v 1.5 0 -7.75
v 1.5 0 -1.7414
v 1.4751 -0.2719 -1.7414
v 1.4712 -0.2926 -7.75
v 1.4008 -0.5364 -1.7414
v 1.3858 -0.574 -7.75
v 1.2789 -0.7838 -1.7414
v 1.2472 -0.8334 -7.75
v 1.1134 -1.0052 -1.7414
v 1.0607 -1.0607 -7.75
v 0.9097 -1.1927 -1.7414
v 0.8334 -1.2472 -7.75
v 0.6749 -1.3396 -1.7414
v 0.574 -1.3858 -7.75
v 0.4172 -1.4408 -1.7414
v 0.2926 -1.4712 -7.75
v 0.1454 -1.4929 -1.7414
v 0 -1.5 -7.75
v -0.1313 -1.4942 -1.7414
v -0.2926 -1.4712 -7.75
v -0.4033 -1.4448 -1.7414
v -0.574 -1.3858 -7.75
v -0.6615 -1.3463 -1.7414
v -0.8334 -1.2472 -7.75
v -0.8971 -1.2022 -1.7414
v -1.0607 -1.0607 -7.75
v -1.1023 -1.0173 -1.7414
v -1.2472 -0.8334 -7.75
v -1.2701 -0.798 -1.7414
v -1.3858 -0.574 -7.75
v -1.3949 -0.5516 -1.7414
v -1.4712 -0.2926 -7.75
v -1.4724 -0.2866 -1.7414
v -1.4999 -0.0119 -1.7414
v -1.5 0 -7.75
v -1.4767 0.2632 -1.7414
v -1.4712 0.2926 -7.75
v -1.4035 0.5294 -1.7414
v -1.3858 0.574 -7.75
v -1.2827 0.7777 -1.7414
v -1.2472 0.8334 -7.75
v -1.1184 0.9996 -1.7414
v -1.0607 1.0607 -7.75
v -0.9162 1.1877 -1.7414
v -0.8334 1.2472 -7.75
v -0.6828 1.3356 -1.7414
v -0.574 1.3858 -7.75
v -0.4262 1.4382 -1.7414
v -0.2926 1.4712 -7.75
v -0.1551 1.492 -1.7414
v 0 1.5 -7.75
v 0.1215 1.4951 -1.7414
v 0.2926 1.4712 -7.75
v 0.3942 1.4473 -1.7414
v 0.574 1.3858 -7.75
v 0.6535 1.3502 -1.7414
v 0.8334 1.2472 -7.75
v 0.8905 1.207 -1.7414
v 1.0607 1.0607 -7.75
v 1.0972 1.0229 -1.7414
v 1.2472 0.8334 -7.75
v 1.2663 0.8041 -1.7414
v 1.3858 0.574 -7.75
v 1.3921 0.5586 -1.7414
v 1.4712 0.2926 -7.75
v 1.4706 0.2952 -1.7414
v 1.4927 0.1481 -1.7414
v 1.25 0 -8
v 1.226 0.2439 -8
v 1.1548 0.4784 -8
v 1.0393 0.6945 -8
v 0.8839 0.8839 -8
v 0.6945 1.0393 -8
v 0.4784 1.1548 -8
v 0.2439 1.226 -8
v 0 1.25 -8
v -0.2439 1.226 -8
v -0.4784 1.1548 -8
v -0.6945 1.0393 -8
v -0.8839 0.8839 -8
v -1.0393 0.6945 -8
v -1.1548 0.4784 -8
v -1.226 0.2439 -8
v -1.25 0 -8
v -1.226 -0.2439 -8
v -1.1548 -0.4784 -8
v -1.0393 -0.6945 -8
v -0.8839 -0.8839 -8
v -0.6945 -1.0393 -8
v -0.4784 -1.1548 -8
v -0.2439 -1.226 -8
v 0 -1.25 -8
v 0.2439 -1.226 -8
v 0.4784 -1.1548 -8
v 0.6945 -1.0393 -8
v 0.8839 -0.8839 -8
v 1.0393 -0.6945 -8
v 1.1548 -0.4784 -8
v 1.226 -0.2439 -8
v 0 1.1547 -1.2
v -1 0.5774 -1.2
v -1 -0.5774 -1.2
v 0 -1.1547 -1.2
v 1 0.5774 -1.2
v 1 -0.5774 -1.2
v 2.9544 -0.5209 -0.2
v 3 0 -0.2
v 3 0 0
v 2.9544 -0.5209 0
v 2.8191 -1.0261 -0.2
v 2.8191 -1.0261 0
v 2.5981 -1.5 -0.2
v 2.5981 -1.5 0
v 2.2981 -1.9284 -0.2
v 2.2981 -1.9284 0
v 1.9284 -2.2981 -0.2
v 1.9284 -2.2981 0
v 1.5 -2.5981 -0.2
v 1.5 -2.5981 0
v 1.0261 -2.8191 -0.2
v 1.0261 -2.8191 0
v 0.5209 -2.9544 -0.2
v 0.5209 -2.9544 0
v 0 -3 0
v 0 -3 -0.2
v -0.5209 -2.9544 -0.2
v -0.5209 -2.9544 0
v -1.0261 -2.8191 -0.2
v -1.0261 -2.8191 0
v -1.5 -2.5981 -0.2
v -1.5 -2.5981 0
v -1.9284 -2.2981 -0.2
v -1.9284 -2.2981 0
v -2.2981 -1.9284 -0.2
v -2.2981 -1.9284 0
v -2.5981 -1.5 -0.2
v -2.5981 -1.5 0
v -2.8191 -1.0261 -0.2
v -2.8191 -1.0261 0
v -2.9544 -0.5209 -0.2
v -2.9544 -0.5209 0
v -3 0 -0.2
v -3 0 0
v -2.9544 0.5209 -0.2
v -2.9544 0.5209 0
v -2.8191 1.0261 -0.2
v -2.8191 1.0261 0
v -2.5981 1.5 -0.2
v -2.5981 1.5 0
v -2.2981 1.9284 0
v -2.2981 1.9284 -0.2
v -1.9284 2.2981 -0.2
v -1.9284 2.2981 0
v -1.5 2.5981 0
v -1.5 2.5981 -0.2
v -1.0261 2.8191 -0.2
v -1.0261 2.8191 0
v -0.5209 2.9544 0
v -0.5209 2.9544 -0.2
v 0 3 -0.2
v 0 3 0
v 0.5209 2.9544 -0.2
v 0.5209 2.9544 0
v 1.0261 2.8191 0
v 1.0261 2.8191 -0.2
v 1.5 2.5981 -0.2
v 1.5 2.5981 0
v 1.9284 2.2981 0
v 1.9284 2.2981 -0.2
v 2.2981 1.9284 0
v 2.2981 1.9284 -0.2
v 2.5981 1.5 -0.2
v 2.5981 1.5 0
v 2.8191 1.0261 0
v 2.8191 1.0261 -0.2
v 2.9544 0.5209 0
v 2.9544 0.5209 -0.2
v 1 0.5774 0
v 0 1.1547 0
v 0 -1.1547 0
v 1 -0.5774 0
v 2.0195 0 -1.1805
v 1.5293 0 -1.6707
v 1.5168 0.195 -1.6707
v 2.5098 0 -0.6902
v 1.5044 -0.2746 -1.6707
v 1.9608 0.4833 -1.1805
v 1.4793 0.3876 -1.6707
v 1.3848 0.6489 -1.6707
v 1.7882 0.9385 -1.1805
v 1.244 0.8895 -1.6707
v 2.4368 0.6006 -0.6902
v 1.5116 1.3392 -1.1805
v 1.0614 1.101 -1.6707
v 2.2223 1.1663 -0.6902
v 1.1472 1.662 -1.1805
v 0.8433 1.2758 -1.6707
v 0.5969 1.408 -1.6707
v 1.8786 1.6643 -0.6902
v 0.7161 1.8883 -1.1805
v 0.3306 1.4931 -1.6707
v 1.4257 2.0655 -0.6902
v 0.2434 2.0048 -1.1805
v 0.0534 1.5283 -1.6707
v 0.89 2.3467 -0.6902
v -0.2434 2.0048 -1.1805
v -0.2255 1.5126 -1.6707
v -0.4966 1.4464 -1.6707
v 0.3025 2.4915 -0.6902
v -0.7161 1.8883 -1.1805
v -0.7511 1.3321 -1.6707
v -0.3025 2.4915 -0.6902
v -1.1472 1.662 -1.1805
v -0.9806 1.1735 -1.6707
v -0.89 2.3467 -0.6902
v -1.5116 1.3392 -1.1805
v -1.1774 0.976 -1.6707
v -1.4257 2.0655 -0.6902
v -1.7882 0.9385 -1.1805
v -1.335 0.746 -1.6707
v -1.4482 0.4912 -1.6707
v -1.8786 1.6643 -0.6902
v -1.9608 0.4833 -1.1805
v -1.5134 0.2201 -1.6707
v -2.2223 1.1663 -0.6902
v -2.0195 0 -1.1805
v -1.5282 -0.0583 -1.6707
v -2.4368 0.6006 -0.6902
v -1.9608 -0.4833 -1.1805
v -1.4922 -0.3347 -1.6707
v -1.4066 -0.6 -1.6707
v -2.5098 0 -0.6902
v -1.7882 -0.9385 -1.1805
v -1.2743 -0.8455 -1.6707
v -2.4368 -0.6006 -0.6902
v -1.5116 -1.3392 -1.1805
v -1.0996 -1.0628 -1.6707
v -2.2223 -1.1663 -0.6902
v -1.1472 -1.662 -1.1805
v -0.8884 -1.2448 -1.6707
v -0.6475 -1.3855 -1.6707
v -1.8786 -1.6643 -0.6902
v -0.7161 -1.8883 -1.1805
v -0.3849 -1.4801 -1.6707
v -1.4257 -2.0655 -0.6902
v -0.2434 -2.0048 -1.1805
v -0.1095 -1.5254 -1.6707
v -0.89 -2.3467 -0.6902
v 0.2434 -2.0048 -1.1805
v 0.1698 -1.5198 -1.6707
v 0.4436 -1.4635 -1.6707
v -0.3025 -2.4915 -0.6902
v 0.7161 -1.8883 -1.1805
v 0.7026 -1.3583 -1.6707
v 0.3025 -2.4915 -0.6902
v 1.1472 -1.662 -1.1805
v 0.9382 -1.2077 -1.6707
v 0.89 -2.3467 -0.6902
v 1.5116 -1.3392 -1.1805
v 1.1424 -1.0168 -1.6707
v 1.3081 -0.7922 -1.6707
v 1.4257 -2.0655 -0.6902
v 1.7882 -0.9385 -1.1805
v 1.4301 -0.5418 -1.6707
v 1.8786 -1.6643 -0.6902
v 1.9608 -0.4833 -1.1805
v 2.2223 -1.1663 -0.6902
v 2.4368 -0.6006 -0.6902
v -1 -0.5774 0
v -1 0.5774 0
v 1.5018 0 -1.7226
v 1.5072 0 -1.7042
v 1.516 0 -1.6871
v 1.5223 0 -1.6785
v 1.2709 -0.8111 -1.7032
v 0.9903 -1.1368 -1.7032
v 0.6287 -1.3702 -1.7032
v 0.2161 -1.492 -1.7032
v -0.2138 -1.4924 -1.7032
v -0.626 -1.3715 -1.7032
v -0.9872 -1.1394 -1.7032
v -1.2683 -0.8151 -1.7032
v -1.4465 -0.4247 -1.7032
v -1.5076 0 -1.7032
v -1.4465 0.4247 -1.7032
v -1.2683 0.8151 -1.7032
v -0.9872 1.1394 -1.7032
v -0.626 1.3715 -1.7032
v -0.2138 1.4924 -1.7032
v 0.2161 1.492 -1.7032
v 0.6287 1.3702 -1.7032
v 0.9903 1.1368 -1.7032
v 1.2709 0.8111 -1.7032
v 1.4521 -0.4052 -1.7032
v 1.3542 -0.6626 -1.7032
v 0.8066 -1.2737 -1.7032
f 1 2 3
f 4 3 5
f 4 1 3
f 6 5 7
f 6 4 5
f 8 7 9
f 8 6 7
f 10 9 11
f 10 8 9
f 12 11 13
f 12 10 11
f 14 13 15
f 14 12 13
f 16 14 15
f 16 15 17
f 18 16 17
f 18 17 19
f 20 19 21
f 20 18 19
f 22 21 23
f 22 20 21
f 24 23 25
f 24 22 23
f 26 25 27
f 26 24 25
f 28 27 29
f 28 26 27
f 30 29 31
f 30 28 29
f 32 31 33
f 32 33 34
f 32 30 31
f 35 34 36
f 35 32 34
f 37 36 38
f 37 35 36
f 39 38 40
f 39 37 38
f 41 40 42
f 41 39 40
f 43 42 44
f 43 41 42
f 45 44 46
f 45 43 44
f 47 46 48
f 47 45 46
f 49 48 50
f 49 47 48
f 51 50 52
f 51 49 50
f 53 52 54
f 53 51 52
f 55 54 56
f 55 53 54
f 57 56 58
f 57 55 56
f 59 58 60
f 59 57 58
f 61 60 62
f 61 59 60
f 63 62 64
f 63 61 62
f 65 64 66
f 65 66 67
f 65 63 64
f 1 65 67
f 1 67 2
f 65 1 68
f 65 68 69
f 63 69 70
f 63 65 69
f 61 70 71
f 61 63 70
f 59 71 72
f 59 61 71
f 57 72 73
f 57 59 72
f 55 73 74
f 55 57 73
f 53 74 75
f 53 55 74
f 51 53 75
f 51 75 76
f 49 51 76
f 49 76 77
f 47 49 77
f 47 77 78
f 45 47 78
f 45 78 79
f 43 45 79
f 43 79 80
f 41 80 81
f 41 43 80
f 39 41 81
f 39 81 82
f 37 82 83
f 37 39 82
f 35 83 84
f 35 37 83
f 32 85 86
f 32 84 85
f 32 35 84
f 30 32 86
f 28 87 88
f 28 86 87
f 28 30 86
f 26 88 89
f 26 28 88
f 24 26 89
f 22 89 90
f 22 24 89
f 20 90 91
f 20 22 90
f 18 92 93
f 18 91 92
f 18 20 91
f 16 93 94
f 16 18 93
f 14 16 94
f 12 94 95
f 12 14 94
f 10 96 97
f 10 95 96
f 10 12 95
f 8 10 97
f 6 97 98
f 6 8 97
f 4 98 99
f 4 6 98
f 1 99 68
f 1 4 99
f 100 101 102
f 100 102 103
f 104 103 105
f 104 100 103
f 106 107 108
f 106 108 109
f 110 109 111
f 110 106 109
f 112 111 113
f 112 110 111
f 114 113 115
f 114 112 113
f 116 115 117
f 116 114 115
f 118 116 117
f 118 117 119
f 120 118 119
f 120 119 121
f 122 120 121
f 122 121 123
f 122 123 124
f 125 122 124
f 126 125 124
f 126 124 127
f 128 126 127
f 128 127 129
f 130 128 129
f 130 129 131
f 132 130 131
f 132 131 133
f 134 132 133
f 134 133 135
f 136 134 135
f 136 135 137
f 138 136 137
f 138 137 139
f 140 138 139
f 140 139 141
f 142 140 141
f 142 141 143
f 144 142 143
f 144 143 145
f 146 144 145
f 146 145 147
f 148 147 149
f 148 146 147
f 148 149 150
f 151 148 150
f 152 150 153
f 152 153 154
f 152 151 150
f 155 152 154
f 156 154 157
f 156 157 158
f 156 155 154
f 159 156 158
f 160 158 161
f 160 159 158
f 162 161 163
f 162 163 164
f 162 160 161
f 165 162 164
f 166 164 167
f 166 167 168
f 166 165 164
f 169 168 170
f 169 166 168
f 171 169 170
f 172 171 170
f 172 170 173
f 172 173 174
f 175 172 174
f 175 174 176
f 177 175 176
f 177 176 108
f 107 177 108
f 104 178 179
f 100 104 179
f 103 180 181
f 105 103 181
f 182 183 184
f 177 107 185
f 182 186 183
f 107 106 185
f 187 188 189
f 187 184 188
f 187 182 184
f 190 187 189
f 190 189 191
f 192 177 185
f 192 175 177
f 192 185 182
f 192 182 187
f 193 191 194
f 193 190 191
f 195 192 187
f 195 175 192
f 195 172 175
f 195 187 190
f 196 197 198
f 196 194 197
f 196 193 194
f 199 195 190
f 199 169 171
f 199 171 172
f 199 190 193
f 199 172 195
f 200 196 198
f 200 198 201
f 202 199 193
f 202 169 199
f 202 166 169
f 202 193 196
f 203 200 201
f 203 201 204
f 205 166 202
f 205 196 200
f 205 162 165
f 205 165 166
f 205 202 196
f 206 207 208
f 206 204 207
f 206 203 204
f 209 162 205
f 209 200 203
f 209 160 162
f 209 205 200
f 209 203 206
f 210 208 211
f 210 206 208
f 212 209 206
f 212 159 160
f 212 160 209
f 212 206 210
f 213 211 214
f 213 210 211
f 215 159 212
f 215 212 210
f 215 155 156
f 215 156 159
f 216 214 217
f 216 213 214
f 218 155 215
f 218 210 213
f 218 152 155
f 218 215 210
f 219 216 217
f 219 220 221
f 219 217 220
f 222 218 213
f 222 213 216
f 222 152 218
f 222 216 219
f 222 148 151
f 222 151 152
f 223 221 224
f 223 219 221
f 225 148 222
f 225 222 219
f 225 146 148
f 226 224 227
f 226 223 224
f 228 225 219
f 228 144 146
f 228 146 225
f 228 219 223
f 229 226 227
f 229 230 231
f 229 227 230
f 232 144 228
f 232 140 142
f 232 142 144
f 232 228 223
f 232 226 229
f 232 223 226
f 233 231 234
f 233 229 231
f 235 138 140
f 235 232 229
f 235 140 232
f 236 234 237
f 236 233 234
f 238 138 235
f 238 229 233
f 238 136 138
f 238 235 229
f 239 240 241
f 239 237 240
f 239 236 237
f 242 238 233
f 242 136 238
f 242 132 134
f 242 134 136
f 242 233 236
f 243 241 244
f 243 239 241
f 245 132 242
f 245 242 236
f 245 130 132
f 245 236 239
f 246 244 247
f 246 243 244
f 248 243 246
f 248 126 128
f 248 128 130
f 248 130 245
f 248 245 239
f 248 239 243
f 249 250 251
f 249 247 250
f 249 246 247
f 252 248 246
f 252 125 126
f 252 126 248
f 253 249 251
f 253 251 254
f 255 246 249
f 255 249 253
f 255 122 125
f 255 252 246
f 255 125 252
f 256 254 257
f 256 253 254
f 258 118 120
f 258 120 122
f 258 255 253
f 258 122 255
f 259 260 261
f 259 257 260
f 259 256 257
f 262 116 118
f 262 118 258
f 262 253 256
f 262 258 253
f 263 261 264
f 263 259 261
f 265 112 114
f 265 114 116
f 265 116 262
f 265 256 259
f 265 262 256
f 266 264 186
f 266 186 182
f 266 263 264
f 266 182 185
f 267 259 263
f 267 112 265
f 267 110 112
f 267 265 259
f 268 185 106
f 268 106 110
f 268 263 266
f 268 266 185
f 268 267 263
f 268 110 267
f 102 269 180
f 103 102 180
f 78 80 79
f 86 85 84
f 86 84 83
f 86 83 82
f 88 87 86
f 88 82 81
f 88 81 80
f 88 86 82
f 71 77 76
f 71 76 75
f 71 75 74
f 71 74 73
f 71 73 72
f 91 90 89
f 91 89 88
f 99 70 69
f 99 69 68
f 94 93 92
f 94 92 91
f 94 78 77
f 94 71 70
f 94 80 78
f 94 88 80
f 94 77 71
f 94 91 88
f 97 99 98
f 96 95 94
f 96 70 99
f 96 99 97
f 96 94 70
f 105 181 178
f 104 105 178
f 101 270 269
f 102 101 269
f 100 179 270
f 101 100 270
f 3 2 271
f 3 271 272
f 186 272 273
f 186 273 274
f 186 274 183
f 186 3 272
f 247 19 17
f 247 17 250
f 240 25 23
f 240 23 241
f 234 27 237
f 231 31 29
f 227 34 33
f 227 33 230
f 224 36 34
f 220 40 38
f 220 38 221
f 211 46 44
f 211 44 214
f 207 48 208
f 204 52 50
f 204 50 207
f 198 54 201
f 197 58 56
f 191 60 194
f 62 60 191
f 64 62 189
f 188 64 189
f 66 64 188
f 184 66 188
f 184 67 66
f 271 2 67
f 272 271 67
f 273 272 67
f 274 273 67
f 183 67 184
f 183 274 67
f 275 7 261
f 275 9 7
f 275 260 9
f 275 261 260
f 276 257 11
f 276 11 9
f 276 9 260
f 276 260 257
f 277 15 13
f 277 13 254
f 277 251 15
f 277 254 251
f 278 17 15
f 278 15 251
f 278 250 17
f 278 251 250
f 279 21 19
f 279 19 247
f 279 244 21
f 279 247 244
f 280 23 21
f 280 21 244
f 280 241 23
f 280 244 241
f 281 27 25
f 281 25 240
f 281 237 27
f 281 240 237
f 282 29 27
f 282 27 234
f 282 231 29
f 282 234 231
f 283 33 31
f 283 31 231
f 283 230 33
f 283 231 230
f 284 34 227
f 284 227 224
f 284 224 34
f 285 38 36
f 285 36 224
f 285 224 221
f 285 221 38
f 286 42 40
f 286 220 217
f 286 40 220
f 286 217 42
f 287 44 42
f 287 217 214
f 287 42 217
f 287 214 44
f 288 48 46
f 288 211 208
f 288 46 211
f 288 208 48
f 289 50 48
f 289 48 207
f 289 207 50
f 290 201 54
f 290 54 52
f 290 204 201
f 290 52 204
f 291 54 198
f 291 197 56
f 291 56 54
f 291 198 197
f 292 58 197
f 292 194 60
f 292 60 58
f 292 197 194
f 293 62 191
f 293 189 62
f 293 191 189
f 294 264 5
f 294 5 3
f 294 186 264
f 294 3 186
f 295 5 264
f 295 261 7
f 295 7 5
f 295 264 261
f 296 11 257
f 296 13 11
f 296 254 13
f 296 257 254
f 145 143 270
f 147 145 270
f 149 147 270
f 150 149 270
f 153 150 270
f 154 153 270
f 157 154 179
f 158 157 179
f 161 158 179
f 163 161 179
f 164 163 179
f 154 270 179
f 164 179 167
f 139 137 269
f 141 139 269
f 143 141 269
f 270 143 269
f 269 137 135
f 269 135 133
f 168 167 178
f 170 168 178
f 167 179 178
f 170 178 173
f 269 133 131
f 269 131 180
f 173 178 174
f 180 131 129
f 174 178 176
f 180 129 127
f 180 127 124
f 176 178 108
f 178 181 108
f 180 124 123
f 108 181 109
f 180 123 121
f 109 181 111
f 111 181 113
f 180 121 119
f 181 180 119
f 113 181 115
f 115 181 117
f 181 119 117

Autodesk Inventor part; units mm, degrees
ref_plane "YZ Plane" through (0, 0, 0) normal (1, 0, 0) x (0, 1, 0)
sketch "Sketch1" plane through (0, 0, 0) normal (0, 1, 0) x (-1, 0, 0)
  point P0 (0, 0)
sketch "Sketch2" plane through (0, 0, 0) normal (0, 1, 0) x (-1, 0, 0)
  line L0 (-1.5, -8) -> (0, -8)
  line L1 (-1.5, -1.7) -> (-1.5, -8)
  line L2 (-3, -0.2) -> (-1.5, -1.7)
  line L3 (-3, 0) -> (-3, -0.2)
  line L4 (0, 0) -> (-3, 0)
  line L5 (0, -8) -> (0, 0)
  line L6 (0, -8) -> (0, 0)
  line L7 (0, -9.6) -> (0, 1.6) projected
  line L8 (0.6, 0) -> (-3.6, 0) projected
  dimension "d3" = 3
  dimension "d5" = 1.5
  dimension "d7" = 8
  dimension "ParC" = 0.2
  dimension "d22" = 0
  dimension "d23" = 0
  dimension "d43" = 45
revolve "Revolution1" add sketch "Sketch2" angle 360 about axis through (0, 0, -8) along (0, 0, -1)
sketch "Sketch3" plane through (0, 0, 0) normal (0, 0, 1) x (1, 0, 0)
  line L0 (-1, 0.5774) -> (-1, -0.5774)
  line L1 (0, 1.1547) -> (-1, 0.5774)
  line L2 (1, 0.5774) -> (0, 1.1547)
  line L3 (1, -0.5774) -> (1, 0.5774)
  line L4 (0, -1.1547) -> (1, -0.5774)
  line L5 (-1, -0.5774) -> (0, -1.1547)
  circle A0 centre (0, 0) radius 1 construction
  circle A1 centre (0, 0) radius 1.5 construction
  dimension "d11" = 2
  dimension "d13" = 120
  dimension "d15" = 120
extrude "Extrusion1" cut sketch "Sketch3" against normal blind 1.2
fillet "Fillet1" radius 0.1 1 edges at (-1.5, 0, -1.7)
chamfer "Chamfer1" distance 0.25 angle 45 1 edges at (-1.5, 0, -8) measured on face at (1.4041, 0.5277, -5.9138)
thread "Thread1" size "M3x0.5" class "6g" standard "ISO Metric profile" length 5.3
ref_plane "MSC_PF1" through (0, 0, 0) normal (1, 0, 0) x (0, 1, 0)
ref_plane "MSC_PT1" through (0, 0, 0) normal (0, 0, -1) x (-1, 0, 0)
equation "\"d3\" = 0.5 * dk"
equation "\"d5\" = 0.5 * NND"
equation "\"d7\" = NLG"
equation "\"d43\" = 0.5 * ang"
equation "\"d18\" = r"
equation "\"d19\" = 0.5 * PTC"
equation "\"d39\" = 0.5 * PTC"
equation "\"d11\" = ParS"
equation "\"d16\" = ParT"
equation "\"NND\" = 3"
equation "\"PTC\" = 0.5"
equation "\"dk\" = 6"
equation "\"ParK\" = 1.7"
equation "\"ParS\" = 2"
equation "\"ParT\" = 1.2"
equation "\"r\" = 0.1"
equation "\"NLG\" = 8"
equation "\"ang\" = 90deg"
equation "\"THREADDIA\" = NND"
properties part number "CSK Allen Key 3x8mm" material "Steel, Mild"
